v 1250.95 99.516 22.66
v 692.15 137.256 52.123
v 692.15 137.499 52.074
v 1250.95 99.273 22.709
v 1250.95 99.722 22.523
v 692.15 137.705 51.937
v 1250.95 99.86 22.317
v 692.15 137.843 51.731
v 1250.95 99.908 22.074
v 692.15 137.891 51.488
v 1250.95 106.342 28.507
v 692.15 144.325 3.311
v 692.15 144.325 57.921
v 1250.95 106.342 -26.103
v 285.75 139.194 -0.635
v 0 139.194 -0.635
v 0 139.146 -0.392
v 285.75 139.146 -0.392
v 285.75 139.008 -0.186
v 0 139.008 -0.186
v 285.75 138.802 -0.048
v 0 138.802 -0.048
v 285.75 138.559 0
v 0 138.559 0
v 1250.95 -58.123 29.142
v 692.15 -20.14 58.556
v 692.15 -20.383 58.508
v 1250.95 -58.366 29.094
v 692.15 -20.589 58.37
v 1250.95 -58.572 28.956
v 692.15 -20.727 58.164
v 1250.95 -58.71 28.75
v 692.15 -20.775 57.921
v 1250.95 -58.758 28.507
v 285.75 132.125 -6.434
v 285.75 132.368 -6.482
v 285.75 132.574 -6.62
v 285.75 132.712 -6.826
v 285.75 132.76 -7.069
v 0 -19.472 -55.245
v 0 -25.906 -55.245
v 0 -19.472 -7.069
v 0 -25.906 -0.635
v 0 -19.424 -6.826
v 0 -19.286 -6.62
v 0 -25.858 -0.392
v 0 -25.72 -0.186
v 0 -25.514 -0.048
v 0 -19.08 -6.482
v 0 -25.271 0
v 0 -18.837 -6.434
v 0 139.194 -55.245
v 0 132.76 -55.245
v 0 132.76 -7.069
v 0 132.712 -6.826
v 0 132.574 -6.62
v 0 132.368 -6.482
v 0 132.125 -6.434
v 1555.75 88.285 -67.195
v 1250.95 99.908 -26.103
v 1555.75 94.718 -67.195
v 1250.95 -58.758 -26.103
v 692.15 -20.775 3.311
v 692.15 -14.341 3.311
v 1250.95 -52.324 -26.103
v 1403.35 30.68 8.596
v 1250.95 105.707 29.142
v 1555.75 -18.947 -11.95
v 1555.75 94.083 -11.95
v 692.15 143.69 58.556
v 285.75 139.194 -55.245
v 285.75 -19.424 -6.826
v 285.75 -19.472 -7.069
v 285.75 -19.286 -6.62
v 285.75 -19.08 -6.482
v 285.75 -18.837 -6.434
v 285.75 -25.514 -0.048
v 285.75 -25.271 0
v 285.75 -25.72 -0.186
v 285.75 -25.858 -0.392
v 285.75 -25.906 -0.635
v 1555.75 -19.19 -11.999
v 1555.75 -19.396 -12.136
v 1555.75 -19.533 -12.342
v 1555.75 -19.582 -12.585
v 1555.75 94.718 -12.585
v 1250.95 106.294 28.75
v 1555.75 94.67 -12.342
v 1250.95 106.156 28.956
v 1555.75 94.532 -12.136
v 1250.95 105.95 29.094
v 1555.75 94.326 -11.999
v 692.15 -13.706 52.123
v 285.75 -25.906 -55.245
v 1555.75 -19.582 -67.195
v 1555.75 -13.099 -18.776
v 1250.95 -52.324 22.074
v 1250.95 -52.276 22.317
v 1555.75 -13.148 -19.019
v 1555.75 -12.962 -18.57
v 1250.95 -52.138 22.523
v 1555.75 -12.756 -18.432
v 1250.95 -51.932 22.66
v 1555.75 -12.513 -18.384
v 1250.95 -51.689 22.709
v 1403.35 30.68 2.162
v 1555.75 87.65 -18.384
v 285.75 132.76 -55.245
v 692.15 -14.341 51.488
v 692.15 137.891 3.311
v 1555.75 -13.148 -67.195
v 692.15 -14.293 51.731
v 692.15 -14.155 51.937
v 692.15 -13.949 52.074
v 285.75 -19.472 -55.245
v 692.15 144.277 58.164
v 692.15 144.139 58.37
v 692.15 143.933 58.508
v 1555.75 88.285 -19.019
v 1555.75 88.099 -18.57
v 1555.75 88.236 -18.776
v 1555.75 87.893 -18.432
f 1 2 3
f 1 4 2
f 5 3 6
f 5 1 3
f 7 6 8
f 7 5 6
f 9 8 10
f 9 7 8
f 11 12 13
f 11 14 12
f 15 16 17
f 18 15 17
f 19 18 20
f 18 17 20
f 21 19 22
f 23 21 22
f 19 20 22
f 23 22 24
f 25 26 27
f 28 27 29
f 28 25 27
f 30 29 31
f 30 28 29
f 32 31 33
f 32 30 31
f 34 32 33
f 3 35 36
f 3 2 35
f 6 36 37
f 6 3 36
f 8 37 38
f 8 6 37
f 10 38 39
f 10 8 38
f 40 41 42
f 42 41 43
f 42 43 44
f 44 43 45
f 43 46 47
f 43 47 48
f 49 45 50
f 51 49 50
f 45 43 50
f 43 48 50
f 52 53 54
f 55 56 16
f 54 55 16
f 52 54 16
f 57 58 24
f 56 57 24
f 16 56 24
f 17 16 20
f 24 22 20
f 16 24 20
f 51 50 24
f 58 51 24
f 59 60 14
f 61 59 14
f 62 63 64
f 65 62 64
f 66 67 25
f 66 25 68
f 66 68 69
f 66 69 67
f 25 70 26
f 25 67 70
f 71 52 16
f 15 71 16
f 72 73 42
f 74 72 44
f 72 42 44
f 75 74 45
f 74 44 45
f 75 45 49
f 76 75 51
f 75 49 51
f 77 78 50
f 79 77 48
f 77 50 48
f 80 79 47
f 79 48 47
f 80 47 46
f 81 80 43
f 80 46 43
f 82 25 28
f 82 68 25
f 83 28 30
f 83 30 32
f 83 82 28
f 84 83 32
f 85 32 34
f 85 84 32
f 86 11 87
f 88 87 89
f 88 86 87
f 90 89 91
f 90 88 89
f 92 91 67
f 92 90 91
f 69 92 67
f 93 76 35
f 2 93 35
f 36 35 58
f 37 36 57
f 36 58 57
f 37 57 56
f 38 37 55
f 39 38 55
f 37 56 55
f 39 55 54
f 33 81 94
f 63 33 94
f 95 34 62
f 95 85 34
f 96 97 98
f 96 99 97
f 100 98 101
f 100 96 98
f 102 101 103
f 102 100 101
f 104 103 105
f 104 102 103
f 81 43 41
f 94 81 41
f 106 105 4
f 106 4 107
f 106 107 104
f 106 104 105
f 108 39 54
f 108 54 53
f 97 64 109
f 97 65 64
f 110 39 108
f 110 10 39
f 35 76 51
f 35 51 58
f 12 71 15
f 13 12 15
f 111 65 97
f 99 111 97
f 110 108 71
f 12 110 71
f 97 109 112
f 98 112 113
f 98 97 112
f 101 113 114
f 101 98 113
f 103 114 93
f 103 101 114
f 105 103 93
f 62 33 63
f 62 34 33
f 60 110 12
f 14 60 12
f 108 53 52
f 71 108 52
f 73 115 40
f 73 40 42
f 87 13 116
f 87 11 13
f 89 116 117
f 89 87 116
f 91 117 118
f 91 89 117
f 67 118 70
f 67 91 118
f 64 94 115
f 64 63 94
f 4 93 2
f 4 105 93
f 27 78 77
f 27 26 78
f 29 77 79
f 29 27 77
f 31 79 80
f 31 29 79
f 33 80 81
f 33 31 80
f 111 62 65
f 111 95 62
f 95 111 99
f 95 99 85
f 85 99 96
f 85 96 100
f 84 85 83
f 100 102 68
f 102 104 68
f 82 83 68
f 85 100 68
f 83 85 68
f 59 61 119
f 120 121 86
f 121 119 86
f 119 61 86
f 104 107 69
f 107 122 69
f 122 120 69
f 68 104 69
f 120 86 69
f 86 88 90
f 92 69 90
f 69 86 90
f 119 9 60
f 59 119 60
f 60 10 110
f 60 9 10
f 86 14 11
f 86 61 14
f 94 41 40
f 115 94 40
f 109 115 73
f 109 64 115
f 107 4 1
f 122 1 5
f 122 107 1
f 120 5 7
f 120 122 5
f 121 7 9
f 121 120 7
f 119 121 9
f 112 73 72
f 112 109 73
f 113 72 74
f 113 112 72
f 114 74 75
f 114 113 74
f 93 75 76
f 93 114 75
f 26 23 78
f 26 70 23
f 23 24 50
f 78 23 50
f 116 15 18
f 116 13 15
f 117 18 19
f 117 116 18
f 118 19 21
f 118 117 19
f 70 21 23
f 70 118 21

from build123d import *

# Parameters (mm, degrees)
F1_DEPTH = 285.75


with BuildPart() as f1:
    # F0 (on Right) → F1 (new body)
    with BuildSketch(Plane.YZ):
        with BuildLine():
            Line((139.1939870883, -55.245), (139.1939870883, -0.635))
            ThreePointArc((139.1939870883, -0.635), (139.0079998944, -0.1859871939), (138.5589870883, 0))
            Line((138.5589870883, 0), (-25.2710129117, 0))
            ThreePointArc((-25.2710129117, 0), (-25.7200257177, -0.1859871939), (-25.9060129117, -0.635))
            Line((-25.9060129117, -0.635), (-25.9060129117, -55.245))
            Line((-25.9060129117, -55.245), (-19.4721929117, -55.245))
            Line((-19.4721929117, -55.245), (-19.4721929117, -7.06882))
            ThreePointArc((-19.4721929117, -7.06882), (-19.2862057177, -6.6198071939), (-18.8371929117, -6.43382))
            Line((-18.8371929117, -6.43382), (132.1251670883, -6.43382))
            ThreePointArc((132.1251670883, -6.43382), (132.5741798944, -6.6198071939), (132.7601670883, -7.06882))
            Line((132.7601670883, -7.06882), (132.7601670883, -55.245))
            Line((132.7601670883, -55.245), (139.1939870883, -55.245))
        make_face()
    extrude(amount=F1_DEPTH)

    # F1_face (on face) → F4 section 0
    with BuildSketch(Plane(origin=(285.75, 56.6439870883, -13.4815357622), x_dir=(0, 1, 0), z_dir=(1, 0, 0))):
        with BuildLine():
            ThreePointArc((75.48118, 7.0477157622), (75.9301928061, 6.8617285682), (76.11618, 6.4127157622))
            Line((76.11618, 6.4127157622), (76.11618, -41.7634642378))
            Line((76.11618, -41.7634642378), (82.55, -41.7634642378))
            Line((82.55, -41.7634642378), (82.55, 12.8465357622))
            ThreePointArc((82.55, 12.8465357622), (82.3640128061, 13.2955485682), (81.915, 13.4815357622))
            Line((81.915, 13.4815357622), (-81.915, 13.4815357622))
            ThreePointArc((-81.915, 13.4815357622), (-82.3640128061, 13.2955485682), (-82.55, 12.8465357622))
            Line((-82.55, 12.8465357622), (-82.55, -41.7634642378))
            Line((-82.55, -41.7634642378), (-76.11618, -41.7634642378))
            Line((-76.11618, -41.7634642378), (-76.11618, 6.4127157622))
            ThreePointArc((-76.11618, 6.4127157622), (-75.9301928061, 6.8617285682), (-75.48118, 7.0477157622))
            Line((-75.48118, 7.0477157622), (75.48118, 7.0477157622))
        make_face()
    # F3 (on offset) → F4 section 1
    with BuildSketch(Plane.YZ.offset(692.15)):
        with BuildLine():
            Line((144.325162816, 3.3113971339), (144.325162816, 57.9213971339))
            ThreePointArc((144.325162816, 57.9213971339), (144.1391756221, 58.3704099399), (143.690162816, 58.5563971339))
            Line((143.690162816, 58.5563971339), (-20.139837184, 58.5563971339))
            ThreePointArc((-20.139837184, 58.5563971339), (-20.58884999, 58.3704099399), (-20.774837184, 57.9213971339))
            Line((-20.774837184, 57.9213971339), (-20.774837184, 3.3113971339))
            Line((-20.774837184, 3.3113971339), (-14.341017184, 3.3113971339))
            Line((-14.341017184, 3.3113971339), (-14.341017184, 51.4875771339))
            ThreePointArc((-14.341017184, 51.4875771339), (-14.15502999, 51.9365899399), (-13.706017184, 52.1225771339))
            Line((-13.706017184, 52.1225771339), (137.256342816, 52.1225771339))
            ThreePointArc((137.256342816, 52.1225771339), (137.7053556221, 51.9365899399), (137.891342816, 51.4875771339))
            Line((137.891342816, 51.4875771339), (137.891342816, 3.3113971339))
            Line((137.891342816, 3.3113971339), (144.325162816, 3.3113971339))
        make_face()
    loft()

    # F4_face (on face) → F7 section 0
    with BuildSketch(Plane(origin=(692.15, 61.775162816, 45.0748613717), x_dir=(0, 1, 0), z_dir=(1, 0, 0))):
        with BuildLine():
            ThreePointArc((75.48118, 7.0477157622), (75.9301928061, 6.8617285682), (76.11618, 6.4127157622))
            Line((76.11618, 6.4127157622), (76.11618, -41.7634642378))
            Line((76.11618, -41.7634642378), (82.55, -41.7634642378))
            Line((82.55, -41.7634642378), (82.55, 12.8465357622))
            ThreePointArc((82.55, 12.8465357622), (82.3640128061, 13.2955485682), (81.915, 13.4815357622))
            Line((81.915, 13.4815357622), (-81.915, 13.4815357622))
            ThreePointArc((-81.915, 13.4815357622), (-82.3640128061, 13.2955485682), (-82.55, 12.8465357622))
            Line((-82.55, 12.8465357622), (-82.55, -41.7634642378))
            Line((-82.55, -41.7634642378), (-76.11618, -41.7634642378))
            Line((-76.11618, -41.7634642378), (-76.11618, 6.4127157622))
            ThreePointArc((-76.11618, 6.4127157622), (-75.9301928061, 6.8617285682), (-75.48118, 7.0477157622))
            Line((-75.48118, 7.0477157622), (75.48118, 7.0477157622))
        make_face()
    # F6 (on offset) → F7 section 1
    with BuildSketch(Plane.YZ.offset(1250.95)):
        with BuildLine():
            Line((106.3418790059, -26.1026672399), (106.3418790059, 28.5073327601))
            ThreePointArc((106.3418790059, 28.5073327601), (106.1558918119, 28.9563455661), (105.7068790059, 29.1423327601))
            Line((105.7068790059, 29.1423327601), (-58.1231209941, 29.1423327601))
            ThreePointArc((-58.1231209941, 29.1423327601), (-58.5721338002, 28.9563455661), (-58.7581209941, 28.5073327601))
            Line((-58.7581209941, 28.5073327601), (-58.7581209941, -26.1026672399))
            Line((-58.7581209941, -26.1026672399), (-52.3243009941, -26.1026672399))
            Line((-52.3243009941, -26.1026672399), (-52.3243009941, 22.0735127601))
            ThreePointArc((-52.3243009941, 22.0735127601), (-52.1383138002, 22.5225255661), (-51.6893009941, 22.7085127601))
            Line((-51.6893009941, 22.7085127601), (99.2730590059, 22.7085127601))
            ThreePointArc((99.2730590059, 22.7085127601), (99.7220718119, 22.5225255661), (99.9080590059, 22.0735127601))
            Line((99.9080590059, 22.0735127601), (99.9080590059, -26.1026672399))
            Line((99.9080590059, -26.1026672399), (106.3418790059, -26.1026672399))
        make_face()
    loft()

    # F7_face (on face) → F10 section 0
    with BuildSketch(Plane(origin=(1250.95, 23.7918790059, 15.6607969979), x_dir=(0, 1, 0), z_dir=(1, 0, 0))):
        with BuildLine():
            ThreePointArc((75.48118, 7.0477157622), (75.9301928061, 6.8617285682), (76.11618, 6.4127157622))
            Line((76.11618, 6.4127157622), (76.11618, -41.7634642378))
            Line((76.11618, -41.7634642378), (82.55, -41.7634642378))
            Line((82.55, -41.7634642378), (82.55, 12.8465357622))
            ThreePointArc((82.55, 12.8465357622), (82.3640128061, 13.2955485682), (81.915, 13.4815357622))
            Line((81.915, 13.4815357622), (-81.915, 13.4815357622))
            ThreePointArc((-81.915, 13.4815357622), (-82.3640128061, 13.2955485682), (-82.55, 12.8465357622))
            Line((-82.55, 12.8465357622), (-82.55, -41.7634642378))
            Line((-82.55, -41.7634642378), (-76.11618, -41.7634642378))
            Line((-76.11618, -41.7634642378), (-76.11618, 6.4127157622))
            ThreePointArc((-76.11618, 6.4127157622), (-75.9301928061, 6.8617285682), (-75.48118, 7.0477157622))
            Line((-75.48118, 7.0477157622), (75.48118, 7.0477157622))
        make_face()
    # F9 (on offset) → F10 section 1
    with BuildSketch(Plane.YZ.offset(1555.75)):
        with BuildLine():
            Line((94.718426384, -67.1952603455), (94.718426384, -12.5852603455))
            ThreePointArc((94.718426384, -12.5852603455), (94.5324391901, -12.1362475394), (94.083426384, -11.9502603455))
            Line((94.083426384, -11.9502603455), (-18.946573616, -11.9502603455))
            ThreePointArc((-18.946573616, -11.9502603455), (-19.395586422, -12.1362475394), (-19.581573616, -12.5852603455))
            Line((-19.581573616, -12.5852603455), (-19.581573616, -67.1952603455))
            Line((-19.581573616, -67.1952603455), (-13.147753616, -67.1952603455))
            Line((-13.147753616, -67.1952603455), (-13.147753616, -19.0190803455))
            ThreePointArc((-13.147753616, -19.0190803455), (-12.961766422, -18.5700675394), (-12.512753616, -18.3840803455))
            Line((-12.512753616, -18.3840803455), (87.649606384, -18.3840803455))
            ThreePointArc((87.649606384, -18.3840803455), (88.0986191901, -18.5700675394), (88.284606384, -19.0190803455))
            Line((88.284606384, -19.0190803455), (88.284606384, -67.1952603455))
            Line((88.284606384, -67.1952603455), (94.718426384, -67.1952603455))
        make_face()
    loft()


solid = f1.part
